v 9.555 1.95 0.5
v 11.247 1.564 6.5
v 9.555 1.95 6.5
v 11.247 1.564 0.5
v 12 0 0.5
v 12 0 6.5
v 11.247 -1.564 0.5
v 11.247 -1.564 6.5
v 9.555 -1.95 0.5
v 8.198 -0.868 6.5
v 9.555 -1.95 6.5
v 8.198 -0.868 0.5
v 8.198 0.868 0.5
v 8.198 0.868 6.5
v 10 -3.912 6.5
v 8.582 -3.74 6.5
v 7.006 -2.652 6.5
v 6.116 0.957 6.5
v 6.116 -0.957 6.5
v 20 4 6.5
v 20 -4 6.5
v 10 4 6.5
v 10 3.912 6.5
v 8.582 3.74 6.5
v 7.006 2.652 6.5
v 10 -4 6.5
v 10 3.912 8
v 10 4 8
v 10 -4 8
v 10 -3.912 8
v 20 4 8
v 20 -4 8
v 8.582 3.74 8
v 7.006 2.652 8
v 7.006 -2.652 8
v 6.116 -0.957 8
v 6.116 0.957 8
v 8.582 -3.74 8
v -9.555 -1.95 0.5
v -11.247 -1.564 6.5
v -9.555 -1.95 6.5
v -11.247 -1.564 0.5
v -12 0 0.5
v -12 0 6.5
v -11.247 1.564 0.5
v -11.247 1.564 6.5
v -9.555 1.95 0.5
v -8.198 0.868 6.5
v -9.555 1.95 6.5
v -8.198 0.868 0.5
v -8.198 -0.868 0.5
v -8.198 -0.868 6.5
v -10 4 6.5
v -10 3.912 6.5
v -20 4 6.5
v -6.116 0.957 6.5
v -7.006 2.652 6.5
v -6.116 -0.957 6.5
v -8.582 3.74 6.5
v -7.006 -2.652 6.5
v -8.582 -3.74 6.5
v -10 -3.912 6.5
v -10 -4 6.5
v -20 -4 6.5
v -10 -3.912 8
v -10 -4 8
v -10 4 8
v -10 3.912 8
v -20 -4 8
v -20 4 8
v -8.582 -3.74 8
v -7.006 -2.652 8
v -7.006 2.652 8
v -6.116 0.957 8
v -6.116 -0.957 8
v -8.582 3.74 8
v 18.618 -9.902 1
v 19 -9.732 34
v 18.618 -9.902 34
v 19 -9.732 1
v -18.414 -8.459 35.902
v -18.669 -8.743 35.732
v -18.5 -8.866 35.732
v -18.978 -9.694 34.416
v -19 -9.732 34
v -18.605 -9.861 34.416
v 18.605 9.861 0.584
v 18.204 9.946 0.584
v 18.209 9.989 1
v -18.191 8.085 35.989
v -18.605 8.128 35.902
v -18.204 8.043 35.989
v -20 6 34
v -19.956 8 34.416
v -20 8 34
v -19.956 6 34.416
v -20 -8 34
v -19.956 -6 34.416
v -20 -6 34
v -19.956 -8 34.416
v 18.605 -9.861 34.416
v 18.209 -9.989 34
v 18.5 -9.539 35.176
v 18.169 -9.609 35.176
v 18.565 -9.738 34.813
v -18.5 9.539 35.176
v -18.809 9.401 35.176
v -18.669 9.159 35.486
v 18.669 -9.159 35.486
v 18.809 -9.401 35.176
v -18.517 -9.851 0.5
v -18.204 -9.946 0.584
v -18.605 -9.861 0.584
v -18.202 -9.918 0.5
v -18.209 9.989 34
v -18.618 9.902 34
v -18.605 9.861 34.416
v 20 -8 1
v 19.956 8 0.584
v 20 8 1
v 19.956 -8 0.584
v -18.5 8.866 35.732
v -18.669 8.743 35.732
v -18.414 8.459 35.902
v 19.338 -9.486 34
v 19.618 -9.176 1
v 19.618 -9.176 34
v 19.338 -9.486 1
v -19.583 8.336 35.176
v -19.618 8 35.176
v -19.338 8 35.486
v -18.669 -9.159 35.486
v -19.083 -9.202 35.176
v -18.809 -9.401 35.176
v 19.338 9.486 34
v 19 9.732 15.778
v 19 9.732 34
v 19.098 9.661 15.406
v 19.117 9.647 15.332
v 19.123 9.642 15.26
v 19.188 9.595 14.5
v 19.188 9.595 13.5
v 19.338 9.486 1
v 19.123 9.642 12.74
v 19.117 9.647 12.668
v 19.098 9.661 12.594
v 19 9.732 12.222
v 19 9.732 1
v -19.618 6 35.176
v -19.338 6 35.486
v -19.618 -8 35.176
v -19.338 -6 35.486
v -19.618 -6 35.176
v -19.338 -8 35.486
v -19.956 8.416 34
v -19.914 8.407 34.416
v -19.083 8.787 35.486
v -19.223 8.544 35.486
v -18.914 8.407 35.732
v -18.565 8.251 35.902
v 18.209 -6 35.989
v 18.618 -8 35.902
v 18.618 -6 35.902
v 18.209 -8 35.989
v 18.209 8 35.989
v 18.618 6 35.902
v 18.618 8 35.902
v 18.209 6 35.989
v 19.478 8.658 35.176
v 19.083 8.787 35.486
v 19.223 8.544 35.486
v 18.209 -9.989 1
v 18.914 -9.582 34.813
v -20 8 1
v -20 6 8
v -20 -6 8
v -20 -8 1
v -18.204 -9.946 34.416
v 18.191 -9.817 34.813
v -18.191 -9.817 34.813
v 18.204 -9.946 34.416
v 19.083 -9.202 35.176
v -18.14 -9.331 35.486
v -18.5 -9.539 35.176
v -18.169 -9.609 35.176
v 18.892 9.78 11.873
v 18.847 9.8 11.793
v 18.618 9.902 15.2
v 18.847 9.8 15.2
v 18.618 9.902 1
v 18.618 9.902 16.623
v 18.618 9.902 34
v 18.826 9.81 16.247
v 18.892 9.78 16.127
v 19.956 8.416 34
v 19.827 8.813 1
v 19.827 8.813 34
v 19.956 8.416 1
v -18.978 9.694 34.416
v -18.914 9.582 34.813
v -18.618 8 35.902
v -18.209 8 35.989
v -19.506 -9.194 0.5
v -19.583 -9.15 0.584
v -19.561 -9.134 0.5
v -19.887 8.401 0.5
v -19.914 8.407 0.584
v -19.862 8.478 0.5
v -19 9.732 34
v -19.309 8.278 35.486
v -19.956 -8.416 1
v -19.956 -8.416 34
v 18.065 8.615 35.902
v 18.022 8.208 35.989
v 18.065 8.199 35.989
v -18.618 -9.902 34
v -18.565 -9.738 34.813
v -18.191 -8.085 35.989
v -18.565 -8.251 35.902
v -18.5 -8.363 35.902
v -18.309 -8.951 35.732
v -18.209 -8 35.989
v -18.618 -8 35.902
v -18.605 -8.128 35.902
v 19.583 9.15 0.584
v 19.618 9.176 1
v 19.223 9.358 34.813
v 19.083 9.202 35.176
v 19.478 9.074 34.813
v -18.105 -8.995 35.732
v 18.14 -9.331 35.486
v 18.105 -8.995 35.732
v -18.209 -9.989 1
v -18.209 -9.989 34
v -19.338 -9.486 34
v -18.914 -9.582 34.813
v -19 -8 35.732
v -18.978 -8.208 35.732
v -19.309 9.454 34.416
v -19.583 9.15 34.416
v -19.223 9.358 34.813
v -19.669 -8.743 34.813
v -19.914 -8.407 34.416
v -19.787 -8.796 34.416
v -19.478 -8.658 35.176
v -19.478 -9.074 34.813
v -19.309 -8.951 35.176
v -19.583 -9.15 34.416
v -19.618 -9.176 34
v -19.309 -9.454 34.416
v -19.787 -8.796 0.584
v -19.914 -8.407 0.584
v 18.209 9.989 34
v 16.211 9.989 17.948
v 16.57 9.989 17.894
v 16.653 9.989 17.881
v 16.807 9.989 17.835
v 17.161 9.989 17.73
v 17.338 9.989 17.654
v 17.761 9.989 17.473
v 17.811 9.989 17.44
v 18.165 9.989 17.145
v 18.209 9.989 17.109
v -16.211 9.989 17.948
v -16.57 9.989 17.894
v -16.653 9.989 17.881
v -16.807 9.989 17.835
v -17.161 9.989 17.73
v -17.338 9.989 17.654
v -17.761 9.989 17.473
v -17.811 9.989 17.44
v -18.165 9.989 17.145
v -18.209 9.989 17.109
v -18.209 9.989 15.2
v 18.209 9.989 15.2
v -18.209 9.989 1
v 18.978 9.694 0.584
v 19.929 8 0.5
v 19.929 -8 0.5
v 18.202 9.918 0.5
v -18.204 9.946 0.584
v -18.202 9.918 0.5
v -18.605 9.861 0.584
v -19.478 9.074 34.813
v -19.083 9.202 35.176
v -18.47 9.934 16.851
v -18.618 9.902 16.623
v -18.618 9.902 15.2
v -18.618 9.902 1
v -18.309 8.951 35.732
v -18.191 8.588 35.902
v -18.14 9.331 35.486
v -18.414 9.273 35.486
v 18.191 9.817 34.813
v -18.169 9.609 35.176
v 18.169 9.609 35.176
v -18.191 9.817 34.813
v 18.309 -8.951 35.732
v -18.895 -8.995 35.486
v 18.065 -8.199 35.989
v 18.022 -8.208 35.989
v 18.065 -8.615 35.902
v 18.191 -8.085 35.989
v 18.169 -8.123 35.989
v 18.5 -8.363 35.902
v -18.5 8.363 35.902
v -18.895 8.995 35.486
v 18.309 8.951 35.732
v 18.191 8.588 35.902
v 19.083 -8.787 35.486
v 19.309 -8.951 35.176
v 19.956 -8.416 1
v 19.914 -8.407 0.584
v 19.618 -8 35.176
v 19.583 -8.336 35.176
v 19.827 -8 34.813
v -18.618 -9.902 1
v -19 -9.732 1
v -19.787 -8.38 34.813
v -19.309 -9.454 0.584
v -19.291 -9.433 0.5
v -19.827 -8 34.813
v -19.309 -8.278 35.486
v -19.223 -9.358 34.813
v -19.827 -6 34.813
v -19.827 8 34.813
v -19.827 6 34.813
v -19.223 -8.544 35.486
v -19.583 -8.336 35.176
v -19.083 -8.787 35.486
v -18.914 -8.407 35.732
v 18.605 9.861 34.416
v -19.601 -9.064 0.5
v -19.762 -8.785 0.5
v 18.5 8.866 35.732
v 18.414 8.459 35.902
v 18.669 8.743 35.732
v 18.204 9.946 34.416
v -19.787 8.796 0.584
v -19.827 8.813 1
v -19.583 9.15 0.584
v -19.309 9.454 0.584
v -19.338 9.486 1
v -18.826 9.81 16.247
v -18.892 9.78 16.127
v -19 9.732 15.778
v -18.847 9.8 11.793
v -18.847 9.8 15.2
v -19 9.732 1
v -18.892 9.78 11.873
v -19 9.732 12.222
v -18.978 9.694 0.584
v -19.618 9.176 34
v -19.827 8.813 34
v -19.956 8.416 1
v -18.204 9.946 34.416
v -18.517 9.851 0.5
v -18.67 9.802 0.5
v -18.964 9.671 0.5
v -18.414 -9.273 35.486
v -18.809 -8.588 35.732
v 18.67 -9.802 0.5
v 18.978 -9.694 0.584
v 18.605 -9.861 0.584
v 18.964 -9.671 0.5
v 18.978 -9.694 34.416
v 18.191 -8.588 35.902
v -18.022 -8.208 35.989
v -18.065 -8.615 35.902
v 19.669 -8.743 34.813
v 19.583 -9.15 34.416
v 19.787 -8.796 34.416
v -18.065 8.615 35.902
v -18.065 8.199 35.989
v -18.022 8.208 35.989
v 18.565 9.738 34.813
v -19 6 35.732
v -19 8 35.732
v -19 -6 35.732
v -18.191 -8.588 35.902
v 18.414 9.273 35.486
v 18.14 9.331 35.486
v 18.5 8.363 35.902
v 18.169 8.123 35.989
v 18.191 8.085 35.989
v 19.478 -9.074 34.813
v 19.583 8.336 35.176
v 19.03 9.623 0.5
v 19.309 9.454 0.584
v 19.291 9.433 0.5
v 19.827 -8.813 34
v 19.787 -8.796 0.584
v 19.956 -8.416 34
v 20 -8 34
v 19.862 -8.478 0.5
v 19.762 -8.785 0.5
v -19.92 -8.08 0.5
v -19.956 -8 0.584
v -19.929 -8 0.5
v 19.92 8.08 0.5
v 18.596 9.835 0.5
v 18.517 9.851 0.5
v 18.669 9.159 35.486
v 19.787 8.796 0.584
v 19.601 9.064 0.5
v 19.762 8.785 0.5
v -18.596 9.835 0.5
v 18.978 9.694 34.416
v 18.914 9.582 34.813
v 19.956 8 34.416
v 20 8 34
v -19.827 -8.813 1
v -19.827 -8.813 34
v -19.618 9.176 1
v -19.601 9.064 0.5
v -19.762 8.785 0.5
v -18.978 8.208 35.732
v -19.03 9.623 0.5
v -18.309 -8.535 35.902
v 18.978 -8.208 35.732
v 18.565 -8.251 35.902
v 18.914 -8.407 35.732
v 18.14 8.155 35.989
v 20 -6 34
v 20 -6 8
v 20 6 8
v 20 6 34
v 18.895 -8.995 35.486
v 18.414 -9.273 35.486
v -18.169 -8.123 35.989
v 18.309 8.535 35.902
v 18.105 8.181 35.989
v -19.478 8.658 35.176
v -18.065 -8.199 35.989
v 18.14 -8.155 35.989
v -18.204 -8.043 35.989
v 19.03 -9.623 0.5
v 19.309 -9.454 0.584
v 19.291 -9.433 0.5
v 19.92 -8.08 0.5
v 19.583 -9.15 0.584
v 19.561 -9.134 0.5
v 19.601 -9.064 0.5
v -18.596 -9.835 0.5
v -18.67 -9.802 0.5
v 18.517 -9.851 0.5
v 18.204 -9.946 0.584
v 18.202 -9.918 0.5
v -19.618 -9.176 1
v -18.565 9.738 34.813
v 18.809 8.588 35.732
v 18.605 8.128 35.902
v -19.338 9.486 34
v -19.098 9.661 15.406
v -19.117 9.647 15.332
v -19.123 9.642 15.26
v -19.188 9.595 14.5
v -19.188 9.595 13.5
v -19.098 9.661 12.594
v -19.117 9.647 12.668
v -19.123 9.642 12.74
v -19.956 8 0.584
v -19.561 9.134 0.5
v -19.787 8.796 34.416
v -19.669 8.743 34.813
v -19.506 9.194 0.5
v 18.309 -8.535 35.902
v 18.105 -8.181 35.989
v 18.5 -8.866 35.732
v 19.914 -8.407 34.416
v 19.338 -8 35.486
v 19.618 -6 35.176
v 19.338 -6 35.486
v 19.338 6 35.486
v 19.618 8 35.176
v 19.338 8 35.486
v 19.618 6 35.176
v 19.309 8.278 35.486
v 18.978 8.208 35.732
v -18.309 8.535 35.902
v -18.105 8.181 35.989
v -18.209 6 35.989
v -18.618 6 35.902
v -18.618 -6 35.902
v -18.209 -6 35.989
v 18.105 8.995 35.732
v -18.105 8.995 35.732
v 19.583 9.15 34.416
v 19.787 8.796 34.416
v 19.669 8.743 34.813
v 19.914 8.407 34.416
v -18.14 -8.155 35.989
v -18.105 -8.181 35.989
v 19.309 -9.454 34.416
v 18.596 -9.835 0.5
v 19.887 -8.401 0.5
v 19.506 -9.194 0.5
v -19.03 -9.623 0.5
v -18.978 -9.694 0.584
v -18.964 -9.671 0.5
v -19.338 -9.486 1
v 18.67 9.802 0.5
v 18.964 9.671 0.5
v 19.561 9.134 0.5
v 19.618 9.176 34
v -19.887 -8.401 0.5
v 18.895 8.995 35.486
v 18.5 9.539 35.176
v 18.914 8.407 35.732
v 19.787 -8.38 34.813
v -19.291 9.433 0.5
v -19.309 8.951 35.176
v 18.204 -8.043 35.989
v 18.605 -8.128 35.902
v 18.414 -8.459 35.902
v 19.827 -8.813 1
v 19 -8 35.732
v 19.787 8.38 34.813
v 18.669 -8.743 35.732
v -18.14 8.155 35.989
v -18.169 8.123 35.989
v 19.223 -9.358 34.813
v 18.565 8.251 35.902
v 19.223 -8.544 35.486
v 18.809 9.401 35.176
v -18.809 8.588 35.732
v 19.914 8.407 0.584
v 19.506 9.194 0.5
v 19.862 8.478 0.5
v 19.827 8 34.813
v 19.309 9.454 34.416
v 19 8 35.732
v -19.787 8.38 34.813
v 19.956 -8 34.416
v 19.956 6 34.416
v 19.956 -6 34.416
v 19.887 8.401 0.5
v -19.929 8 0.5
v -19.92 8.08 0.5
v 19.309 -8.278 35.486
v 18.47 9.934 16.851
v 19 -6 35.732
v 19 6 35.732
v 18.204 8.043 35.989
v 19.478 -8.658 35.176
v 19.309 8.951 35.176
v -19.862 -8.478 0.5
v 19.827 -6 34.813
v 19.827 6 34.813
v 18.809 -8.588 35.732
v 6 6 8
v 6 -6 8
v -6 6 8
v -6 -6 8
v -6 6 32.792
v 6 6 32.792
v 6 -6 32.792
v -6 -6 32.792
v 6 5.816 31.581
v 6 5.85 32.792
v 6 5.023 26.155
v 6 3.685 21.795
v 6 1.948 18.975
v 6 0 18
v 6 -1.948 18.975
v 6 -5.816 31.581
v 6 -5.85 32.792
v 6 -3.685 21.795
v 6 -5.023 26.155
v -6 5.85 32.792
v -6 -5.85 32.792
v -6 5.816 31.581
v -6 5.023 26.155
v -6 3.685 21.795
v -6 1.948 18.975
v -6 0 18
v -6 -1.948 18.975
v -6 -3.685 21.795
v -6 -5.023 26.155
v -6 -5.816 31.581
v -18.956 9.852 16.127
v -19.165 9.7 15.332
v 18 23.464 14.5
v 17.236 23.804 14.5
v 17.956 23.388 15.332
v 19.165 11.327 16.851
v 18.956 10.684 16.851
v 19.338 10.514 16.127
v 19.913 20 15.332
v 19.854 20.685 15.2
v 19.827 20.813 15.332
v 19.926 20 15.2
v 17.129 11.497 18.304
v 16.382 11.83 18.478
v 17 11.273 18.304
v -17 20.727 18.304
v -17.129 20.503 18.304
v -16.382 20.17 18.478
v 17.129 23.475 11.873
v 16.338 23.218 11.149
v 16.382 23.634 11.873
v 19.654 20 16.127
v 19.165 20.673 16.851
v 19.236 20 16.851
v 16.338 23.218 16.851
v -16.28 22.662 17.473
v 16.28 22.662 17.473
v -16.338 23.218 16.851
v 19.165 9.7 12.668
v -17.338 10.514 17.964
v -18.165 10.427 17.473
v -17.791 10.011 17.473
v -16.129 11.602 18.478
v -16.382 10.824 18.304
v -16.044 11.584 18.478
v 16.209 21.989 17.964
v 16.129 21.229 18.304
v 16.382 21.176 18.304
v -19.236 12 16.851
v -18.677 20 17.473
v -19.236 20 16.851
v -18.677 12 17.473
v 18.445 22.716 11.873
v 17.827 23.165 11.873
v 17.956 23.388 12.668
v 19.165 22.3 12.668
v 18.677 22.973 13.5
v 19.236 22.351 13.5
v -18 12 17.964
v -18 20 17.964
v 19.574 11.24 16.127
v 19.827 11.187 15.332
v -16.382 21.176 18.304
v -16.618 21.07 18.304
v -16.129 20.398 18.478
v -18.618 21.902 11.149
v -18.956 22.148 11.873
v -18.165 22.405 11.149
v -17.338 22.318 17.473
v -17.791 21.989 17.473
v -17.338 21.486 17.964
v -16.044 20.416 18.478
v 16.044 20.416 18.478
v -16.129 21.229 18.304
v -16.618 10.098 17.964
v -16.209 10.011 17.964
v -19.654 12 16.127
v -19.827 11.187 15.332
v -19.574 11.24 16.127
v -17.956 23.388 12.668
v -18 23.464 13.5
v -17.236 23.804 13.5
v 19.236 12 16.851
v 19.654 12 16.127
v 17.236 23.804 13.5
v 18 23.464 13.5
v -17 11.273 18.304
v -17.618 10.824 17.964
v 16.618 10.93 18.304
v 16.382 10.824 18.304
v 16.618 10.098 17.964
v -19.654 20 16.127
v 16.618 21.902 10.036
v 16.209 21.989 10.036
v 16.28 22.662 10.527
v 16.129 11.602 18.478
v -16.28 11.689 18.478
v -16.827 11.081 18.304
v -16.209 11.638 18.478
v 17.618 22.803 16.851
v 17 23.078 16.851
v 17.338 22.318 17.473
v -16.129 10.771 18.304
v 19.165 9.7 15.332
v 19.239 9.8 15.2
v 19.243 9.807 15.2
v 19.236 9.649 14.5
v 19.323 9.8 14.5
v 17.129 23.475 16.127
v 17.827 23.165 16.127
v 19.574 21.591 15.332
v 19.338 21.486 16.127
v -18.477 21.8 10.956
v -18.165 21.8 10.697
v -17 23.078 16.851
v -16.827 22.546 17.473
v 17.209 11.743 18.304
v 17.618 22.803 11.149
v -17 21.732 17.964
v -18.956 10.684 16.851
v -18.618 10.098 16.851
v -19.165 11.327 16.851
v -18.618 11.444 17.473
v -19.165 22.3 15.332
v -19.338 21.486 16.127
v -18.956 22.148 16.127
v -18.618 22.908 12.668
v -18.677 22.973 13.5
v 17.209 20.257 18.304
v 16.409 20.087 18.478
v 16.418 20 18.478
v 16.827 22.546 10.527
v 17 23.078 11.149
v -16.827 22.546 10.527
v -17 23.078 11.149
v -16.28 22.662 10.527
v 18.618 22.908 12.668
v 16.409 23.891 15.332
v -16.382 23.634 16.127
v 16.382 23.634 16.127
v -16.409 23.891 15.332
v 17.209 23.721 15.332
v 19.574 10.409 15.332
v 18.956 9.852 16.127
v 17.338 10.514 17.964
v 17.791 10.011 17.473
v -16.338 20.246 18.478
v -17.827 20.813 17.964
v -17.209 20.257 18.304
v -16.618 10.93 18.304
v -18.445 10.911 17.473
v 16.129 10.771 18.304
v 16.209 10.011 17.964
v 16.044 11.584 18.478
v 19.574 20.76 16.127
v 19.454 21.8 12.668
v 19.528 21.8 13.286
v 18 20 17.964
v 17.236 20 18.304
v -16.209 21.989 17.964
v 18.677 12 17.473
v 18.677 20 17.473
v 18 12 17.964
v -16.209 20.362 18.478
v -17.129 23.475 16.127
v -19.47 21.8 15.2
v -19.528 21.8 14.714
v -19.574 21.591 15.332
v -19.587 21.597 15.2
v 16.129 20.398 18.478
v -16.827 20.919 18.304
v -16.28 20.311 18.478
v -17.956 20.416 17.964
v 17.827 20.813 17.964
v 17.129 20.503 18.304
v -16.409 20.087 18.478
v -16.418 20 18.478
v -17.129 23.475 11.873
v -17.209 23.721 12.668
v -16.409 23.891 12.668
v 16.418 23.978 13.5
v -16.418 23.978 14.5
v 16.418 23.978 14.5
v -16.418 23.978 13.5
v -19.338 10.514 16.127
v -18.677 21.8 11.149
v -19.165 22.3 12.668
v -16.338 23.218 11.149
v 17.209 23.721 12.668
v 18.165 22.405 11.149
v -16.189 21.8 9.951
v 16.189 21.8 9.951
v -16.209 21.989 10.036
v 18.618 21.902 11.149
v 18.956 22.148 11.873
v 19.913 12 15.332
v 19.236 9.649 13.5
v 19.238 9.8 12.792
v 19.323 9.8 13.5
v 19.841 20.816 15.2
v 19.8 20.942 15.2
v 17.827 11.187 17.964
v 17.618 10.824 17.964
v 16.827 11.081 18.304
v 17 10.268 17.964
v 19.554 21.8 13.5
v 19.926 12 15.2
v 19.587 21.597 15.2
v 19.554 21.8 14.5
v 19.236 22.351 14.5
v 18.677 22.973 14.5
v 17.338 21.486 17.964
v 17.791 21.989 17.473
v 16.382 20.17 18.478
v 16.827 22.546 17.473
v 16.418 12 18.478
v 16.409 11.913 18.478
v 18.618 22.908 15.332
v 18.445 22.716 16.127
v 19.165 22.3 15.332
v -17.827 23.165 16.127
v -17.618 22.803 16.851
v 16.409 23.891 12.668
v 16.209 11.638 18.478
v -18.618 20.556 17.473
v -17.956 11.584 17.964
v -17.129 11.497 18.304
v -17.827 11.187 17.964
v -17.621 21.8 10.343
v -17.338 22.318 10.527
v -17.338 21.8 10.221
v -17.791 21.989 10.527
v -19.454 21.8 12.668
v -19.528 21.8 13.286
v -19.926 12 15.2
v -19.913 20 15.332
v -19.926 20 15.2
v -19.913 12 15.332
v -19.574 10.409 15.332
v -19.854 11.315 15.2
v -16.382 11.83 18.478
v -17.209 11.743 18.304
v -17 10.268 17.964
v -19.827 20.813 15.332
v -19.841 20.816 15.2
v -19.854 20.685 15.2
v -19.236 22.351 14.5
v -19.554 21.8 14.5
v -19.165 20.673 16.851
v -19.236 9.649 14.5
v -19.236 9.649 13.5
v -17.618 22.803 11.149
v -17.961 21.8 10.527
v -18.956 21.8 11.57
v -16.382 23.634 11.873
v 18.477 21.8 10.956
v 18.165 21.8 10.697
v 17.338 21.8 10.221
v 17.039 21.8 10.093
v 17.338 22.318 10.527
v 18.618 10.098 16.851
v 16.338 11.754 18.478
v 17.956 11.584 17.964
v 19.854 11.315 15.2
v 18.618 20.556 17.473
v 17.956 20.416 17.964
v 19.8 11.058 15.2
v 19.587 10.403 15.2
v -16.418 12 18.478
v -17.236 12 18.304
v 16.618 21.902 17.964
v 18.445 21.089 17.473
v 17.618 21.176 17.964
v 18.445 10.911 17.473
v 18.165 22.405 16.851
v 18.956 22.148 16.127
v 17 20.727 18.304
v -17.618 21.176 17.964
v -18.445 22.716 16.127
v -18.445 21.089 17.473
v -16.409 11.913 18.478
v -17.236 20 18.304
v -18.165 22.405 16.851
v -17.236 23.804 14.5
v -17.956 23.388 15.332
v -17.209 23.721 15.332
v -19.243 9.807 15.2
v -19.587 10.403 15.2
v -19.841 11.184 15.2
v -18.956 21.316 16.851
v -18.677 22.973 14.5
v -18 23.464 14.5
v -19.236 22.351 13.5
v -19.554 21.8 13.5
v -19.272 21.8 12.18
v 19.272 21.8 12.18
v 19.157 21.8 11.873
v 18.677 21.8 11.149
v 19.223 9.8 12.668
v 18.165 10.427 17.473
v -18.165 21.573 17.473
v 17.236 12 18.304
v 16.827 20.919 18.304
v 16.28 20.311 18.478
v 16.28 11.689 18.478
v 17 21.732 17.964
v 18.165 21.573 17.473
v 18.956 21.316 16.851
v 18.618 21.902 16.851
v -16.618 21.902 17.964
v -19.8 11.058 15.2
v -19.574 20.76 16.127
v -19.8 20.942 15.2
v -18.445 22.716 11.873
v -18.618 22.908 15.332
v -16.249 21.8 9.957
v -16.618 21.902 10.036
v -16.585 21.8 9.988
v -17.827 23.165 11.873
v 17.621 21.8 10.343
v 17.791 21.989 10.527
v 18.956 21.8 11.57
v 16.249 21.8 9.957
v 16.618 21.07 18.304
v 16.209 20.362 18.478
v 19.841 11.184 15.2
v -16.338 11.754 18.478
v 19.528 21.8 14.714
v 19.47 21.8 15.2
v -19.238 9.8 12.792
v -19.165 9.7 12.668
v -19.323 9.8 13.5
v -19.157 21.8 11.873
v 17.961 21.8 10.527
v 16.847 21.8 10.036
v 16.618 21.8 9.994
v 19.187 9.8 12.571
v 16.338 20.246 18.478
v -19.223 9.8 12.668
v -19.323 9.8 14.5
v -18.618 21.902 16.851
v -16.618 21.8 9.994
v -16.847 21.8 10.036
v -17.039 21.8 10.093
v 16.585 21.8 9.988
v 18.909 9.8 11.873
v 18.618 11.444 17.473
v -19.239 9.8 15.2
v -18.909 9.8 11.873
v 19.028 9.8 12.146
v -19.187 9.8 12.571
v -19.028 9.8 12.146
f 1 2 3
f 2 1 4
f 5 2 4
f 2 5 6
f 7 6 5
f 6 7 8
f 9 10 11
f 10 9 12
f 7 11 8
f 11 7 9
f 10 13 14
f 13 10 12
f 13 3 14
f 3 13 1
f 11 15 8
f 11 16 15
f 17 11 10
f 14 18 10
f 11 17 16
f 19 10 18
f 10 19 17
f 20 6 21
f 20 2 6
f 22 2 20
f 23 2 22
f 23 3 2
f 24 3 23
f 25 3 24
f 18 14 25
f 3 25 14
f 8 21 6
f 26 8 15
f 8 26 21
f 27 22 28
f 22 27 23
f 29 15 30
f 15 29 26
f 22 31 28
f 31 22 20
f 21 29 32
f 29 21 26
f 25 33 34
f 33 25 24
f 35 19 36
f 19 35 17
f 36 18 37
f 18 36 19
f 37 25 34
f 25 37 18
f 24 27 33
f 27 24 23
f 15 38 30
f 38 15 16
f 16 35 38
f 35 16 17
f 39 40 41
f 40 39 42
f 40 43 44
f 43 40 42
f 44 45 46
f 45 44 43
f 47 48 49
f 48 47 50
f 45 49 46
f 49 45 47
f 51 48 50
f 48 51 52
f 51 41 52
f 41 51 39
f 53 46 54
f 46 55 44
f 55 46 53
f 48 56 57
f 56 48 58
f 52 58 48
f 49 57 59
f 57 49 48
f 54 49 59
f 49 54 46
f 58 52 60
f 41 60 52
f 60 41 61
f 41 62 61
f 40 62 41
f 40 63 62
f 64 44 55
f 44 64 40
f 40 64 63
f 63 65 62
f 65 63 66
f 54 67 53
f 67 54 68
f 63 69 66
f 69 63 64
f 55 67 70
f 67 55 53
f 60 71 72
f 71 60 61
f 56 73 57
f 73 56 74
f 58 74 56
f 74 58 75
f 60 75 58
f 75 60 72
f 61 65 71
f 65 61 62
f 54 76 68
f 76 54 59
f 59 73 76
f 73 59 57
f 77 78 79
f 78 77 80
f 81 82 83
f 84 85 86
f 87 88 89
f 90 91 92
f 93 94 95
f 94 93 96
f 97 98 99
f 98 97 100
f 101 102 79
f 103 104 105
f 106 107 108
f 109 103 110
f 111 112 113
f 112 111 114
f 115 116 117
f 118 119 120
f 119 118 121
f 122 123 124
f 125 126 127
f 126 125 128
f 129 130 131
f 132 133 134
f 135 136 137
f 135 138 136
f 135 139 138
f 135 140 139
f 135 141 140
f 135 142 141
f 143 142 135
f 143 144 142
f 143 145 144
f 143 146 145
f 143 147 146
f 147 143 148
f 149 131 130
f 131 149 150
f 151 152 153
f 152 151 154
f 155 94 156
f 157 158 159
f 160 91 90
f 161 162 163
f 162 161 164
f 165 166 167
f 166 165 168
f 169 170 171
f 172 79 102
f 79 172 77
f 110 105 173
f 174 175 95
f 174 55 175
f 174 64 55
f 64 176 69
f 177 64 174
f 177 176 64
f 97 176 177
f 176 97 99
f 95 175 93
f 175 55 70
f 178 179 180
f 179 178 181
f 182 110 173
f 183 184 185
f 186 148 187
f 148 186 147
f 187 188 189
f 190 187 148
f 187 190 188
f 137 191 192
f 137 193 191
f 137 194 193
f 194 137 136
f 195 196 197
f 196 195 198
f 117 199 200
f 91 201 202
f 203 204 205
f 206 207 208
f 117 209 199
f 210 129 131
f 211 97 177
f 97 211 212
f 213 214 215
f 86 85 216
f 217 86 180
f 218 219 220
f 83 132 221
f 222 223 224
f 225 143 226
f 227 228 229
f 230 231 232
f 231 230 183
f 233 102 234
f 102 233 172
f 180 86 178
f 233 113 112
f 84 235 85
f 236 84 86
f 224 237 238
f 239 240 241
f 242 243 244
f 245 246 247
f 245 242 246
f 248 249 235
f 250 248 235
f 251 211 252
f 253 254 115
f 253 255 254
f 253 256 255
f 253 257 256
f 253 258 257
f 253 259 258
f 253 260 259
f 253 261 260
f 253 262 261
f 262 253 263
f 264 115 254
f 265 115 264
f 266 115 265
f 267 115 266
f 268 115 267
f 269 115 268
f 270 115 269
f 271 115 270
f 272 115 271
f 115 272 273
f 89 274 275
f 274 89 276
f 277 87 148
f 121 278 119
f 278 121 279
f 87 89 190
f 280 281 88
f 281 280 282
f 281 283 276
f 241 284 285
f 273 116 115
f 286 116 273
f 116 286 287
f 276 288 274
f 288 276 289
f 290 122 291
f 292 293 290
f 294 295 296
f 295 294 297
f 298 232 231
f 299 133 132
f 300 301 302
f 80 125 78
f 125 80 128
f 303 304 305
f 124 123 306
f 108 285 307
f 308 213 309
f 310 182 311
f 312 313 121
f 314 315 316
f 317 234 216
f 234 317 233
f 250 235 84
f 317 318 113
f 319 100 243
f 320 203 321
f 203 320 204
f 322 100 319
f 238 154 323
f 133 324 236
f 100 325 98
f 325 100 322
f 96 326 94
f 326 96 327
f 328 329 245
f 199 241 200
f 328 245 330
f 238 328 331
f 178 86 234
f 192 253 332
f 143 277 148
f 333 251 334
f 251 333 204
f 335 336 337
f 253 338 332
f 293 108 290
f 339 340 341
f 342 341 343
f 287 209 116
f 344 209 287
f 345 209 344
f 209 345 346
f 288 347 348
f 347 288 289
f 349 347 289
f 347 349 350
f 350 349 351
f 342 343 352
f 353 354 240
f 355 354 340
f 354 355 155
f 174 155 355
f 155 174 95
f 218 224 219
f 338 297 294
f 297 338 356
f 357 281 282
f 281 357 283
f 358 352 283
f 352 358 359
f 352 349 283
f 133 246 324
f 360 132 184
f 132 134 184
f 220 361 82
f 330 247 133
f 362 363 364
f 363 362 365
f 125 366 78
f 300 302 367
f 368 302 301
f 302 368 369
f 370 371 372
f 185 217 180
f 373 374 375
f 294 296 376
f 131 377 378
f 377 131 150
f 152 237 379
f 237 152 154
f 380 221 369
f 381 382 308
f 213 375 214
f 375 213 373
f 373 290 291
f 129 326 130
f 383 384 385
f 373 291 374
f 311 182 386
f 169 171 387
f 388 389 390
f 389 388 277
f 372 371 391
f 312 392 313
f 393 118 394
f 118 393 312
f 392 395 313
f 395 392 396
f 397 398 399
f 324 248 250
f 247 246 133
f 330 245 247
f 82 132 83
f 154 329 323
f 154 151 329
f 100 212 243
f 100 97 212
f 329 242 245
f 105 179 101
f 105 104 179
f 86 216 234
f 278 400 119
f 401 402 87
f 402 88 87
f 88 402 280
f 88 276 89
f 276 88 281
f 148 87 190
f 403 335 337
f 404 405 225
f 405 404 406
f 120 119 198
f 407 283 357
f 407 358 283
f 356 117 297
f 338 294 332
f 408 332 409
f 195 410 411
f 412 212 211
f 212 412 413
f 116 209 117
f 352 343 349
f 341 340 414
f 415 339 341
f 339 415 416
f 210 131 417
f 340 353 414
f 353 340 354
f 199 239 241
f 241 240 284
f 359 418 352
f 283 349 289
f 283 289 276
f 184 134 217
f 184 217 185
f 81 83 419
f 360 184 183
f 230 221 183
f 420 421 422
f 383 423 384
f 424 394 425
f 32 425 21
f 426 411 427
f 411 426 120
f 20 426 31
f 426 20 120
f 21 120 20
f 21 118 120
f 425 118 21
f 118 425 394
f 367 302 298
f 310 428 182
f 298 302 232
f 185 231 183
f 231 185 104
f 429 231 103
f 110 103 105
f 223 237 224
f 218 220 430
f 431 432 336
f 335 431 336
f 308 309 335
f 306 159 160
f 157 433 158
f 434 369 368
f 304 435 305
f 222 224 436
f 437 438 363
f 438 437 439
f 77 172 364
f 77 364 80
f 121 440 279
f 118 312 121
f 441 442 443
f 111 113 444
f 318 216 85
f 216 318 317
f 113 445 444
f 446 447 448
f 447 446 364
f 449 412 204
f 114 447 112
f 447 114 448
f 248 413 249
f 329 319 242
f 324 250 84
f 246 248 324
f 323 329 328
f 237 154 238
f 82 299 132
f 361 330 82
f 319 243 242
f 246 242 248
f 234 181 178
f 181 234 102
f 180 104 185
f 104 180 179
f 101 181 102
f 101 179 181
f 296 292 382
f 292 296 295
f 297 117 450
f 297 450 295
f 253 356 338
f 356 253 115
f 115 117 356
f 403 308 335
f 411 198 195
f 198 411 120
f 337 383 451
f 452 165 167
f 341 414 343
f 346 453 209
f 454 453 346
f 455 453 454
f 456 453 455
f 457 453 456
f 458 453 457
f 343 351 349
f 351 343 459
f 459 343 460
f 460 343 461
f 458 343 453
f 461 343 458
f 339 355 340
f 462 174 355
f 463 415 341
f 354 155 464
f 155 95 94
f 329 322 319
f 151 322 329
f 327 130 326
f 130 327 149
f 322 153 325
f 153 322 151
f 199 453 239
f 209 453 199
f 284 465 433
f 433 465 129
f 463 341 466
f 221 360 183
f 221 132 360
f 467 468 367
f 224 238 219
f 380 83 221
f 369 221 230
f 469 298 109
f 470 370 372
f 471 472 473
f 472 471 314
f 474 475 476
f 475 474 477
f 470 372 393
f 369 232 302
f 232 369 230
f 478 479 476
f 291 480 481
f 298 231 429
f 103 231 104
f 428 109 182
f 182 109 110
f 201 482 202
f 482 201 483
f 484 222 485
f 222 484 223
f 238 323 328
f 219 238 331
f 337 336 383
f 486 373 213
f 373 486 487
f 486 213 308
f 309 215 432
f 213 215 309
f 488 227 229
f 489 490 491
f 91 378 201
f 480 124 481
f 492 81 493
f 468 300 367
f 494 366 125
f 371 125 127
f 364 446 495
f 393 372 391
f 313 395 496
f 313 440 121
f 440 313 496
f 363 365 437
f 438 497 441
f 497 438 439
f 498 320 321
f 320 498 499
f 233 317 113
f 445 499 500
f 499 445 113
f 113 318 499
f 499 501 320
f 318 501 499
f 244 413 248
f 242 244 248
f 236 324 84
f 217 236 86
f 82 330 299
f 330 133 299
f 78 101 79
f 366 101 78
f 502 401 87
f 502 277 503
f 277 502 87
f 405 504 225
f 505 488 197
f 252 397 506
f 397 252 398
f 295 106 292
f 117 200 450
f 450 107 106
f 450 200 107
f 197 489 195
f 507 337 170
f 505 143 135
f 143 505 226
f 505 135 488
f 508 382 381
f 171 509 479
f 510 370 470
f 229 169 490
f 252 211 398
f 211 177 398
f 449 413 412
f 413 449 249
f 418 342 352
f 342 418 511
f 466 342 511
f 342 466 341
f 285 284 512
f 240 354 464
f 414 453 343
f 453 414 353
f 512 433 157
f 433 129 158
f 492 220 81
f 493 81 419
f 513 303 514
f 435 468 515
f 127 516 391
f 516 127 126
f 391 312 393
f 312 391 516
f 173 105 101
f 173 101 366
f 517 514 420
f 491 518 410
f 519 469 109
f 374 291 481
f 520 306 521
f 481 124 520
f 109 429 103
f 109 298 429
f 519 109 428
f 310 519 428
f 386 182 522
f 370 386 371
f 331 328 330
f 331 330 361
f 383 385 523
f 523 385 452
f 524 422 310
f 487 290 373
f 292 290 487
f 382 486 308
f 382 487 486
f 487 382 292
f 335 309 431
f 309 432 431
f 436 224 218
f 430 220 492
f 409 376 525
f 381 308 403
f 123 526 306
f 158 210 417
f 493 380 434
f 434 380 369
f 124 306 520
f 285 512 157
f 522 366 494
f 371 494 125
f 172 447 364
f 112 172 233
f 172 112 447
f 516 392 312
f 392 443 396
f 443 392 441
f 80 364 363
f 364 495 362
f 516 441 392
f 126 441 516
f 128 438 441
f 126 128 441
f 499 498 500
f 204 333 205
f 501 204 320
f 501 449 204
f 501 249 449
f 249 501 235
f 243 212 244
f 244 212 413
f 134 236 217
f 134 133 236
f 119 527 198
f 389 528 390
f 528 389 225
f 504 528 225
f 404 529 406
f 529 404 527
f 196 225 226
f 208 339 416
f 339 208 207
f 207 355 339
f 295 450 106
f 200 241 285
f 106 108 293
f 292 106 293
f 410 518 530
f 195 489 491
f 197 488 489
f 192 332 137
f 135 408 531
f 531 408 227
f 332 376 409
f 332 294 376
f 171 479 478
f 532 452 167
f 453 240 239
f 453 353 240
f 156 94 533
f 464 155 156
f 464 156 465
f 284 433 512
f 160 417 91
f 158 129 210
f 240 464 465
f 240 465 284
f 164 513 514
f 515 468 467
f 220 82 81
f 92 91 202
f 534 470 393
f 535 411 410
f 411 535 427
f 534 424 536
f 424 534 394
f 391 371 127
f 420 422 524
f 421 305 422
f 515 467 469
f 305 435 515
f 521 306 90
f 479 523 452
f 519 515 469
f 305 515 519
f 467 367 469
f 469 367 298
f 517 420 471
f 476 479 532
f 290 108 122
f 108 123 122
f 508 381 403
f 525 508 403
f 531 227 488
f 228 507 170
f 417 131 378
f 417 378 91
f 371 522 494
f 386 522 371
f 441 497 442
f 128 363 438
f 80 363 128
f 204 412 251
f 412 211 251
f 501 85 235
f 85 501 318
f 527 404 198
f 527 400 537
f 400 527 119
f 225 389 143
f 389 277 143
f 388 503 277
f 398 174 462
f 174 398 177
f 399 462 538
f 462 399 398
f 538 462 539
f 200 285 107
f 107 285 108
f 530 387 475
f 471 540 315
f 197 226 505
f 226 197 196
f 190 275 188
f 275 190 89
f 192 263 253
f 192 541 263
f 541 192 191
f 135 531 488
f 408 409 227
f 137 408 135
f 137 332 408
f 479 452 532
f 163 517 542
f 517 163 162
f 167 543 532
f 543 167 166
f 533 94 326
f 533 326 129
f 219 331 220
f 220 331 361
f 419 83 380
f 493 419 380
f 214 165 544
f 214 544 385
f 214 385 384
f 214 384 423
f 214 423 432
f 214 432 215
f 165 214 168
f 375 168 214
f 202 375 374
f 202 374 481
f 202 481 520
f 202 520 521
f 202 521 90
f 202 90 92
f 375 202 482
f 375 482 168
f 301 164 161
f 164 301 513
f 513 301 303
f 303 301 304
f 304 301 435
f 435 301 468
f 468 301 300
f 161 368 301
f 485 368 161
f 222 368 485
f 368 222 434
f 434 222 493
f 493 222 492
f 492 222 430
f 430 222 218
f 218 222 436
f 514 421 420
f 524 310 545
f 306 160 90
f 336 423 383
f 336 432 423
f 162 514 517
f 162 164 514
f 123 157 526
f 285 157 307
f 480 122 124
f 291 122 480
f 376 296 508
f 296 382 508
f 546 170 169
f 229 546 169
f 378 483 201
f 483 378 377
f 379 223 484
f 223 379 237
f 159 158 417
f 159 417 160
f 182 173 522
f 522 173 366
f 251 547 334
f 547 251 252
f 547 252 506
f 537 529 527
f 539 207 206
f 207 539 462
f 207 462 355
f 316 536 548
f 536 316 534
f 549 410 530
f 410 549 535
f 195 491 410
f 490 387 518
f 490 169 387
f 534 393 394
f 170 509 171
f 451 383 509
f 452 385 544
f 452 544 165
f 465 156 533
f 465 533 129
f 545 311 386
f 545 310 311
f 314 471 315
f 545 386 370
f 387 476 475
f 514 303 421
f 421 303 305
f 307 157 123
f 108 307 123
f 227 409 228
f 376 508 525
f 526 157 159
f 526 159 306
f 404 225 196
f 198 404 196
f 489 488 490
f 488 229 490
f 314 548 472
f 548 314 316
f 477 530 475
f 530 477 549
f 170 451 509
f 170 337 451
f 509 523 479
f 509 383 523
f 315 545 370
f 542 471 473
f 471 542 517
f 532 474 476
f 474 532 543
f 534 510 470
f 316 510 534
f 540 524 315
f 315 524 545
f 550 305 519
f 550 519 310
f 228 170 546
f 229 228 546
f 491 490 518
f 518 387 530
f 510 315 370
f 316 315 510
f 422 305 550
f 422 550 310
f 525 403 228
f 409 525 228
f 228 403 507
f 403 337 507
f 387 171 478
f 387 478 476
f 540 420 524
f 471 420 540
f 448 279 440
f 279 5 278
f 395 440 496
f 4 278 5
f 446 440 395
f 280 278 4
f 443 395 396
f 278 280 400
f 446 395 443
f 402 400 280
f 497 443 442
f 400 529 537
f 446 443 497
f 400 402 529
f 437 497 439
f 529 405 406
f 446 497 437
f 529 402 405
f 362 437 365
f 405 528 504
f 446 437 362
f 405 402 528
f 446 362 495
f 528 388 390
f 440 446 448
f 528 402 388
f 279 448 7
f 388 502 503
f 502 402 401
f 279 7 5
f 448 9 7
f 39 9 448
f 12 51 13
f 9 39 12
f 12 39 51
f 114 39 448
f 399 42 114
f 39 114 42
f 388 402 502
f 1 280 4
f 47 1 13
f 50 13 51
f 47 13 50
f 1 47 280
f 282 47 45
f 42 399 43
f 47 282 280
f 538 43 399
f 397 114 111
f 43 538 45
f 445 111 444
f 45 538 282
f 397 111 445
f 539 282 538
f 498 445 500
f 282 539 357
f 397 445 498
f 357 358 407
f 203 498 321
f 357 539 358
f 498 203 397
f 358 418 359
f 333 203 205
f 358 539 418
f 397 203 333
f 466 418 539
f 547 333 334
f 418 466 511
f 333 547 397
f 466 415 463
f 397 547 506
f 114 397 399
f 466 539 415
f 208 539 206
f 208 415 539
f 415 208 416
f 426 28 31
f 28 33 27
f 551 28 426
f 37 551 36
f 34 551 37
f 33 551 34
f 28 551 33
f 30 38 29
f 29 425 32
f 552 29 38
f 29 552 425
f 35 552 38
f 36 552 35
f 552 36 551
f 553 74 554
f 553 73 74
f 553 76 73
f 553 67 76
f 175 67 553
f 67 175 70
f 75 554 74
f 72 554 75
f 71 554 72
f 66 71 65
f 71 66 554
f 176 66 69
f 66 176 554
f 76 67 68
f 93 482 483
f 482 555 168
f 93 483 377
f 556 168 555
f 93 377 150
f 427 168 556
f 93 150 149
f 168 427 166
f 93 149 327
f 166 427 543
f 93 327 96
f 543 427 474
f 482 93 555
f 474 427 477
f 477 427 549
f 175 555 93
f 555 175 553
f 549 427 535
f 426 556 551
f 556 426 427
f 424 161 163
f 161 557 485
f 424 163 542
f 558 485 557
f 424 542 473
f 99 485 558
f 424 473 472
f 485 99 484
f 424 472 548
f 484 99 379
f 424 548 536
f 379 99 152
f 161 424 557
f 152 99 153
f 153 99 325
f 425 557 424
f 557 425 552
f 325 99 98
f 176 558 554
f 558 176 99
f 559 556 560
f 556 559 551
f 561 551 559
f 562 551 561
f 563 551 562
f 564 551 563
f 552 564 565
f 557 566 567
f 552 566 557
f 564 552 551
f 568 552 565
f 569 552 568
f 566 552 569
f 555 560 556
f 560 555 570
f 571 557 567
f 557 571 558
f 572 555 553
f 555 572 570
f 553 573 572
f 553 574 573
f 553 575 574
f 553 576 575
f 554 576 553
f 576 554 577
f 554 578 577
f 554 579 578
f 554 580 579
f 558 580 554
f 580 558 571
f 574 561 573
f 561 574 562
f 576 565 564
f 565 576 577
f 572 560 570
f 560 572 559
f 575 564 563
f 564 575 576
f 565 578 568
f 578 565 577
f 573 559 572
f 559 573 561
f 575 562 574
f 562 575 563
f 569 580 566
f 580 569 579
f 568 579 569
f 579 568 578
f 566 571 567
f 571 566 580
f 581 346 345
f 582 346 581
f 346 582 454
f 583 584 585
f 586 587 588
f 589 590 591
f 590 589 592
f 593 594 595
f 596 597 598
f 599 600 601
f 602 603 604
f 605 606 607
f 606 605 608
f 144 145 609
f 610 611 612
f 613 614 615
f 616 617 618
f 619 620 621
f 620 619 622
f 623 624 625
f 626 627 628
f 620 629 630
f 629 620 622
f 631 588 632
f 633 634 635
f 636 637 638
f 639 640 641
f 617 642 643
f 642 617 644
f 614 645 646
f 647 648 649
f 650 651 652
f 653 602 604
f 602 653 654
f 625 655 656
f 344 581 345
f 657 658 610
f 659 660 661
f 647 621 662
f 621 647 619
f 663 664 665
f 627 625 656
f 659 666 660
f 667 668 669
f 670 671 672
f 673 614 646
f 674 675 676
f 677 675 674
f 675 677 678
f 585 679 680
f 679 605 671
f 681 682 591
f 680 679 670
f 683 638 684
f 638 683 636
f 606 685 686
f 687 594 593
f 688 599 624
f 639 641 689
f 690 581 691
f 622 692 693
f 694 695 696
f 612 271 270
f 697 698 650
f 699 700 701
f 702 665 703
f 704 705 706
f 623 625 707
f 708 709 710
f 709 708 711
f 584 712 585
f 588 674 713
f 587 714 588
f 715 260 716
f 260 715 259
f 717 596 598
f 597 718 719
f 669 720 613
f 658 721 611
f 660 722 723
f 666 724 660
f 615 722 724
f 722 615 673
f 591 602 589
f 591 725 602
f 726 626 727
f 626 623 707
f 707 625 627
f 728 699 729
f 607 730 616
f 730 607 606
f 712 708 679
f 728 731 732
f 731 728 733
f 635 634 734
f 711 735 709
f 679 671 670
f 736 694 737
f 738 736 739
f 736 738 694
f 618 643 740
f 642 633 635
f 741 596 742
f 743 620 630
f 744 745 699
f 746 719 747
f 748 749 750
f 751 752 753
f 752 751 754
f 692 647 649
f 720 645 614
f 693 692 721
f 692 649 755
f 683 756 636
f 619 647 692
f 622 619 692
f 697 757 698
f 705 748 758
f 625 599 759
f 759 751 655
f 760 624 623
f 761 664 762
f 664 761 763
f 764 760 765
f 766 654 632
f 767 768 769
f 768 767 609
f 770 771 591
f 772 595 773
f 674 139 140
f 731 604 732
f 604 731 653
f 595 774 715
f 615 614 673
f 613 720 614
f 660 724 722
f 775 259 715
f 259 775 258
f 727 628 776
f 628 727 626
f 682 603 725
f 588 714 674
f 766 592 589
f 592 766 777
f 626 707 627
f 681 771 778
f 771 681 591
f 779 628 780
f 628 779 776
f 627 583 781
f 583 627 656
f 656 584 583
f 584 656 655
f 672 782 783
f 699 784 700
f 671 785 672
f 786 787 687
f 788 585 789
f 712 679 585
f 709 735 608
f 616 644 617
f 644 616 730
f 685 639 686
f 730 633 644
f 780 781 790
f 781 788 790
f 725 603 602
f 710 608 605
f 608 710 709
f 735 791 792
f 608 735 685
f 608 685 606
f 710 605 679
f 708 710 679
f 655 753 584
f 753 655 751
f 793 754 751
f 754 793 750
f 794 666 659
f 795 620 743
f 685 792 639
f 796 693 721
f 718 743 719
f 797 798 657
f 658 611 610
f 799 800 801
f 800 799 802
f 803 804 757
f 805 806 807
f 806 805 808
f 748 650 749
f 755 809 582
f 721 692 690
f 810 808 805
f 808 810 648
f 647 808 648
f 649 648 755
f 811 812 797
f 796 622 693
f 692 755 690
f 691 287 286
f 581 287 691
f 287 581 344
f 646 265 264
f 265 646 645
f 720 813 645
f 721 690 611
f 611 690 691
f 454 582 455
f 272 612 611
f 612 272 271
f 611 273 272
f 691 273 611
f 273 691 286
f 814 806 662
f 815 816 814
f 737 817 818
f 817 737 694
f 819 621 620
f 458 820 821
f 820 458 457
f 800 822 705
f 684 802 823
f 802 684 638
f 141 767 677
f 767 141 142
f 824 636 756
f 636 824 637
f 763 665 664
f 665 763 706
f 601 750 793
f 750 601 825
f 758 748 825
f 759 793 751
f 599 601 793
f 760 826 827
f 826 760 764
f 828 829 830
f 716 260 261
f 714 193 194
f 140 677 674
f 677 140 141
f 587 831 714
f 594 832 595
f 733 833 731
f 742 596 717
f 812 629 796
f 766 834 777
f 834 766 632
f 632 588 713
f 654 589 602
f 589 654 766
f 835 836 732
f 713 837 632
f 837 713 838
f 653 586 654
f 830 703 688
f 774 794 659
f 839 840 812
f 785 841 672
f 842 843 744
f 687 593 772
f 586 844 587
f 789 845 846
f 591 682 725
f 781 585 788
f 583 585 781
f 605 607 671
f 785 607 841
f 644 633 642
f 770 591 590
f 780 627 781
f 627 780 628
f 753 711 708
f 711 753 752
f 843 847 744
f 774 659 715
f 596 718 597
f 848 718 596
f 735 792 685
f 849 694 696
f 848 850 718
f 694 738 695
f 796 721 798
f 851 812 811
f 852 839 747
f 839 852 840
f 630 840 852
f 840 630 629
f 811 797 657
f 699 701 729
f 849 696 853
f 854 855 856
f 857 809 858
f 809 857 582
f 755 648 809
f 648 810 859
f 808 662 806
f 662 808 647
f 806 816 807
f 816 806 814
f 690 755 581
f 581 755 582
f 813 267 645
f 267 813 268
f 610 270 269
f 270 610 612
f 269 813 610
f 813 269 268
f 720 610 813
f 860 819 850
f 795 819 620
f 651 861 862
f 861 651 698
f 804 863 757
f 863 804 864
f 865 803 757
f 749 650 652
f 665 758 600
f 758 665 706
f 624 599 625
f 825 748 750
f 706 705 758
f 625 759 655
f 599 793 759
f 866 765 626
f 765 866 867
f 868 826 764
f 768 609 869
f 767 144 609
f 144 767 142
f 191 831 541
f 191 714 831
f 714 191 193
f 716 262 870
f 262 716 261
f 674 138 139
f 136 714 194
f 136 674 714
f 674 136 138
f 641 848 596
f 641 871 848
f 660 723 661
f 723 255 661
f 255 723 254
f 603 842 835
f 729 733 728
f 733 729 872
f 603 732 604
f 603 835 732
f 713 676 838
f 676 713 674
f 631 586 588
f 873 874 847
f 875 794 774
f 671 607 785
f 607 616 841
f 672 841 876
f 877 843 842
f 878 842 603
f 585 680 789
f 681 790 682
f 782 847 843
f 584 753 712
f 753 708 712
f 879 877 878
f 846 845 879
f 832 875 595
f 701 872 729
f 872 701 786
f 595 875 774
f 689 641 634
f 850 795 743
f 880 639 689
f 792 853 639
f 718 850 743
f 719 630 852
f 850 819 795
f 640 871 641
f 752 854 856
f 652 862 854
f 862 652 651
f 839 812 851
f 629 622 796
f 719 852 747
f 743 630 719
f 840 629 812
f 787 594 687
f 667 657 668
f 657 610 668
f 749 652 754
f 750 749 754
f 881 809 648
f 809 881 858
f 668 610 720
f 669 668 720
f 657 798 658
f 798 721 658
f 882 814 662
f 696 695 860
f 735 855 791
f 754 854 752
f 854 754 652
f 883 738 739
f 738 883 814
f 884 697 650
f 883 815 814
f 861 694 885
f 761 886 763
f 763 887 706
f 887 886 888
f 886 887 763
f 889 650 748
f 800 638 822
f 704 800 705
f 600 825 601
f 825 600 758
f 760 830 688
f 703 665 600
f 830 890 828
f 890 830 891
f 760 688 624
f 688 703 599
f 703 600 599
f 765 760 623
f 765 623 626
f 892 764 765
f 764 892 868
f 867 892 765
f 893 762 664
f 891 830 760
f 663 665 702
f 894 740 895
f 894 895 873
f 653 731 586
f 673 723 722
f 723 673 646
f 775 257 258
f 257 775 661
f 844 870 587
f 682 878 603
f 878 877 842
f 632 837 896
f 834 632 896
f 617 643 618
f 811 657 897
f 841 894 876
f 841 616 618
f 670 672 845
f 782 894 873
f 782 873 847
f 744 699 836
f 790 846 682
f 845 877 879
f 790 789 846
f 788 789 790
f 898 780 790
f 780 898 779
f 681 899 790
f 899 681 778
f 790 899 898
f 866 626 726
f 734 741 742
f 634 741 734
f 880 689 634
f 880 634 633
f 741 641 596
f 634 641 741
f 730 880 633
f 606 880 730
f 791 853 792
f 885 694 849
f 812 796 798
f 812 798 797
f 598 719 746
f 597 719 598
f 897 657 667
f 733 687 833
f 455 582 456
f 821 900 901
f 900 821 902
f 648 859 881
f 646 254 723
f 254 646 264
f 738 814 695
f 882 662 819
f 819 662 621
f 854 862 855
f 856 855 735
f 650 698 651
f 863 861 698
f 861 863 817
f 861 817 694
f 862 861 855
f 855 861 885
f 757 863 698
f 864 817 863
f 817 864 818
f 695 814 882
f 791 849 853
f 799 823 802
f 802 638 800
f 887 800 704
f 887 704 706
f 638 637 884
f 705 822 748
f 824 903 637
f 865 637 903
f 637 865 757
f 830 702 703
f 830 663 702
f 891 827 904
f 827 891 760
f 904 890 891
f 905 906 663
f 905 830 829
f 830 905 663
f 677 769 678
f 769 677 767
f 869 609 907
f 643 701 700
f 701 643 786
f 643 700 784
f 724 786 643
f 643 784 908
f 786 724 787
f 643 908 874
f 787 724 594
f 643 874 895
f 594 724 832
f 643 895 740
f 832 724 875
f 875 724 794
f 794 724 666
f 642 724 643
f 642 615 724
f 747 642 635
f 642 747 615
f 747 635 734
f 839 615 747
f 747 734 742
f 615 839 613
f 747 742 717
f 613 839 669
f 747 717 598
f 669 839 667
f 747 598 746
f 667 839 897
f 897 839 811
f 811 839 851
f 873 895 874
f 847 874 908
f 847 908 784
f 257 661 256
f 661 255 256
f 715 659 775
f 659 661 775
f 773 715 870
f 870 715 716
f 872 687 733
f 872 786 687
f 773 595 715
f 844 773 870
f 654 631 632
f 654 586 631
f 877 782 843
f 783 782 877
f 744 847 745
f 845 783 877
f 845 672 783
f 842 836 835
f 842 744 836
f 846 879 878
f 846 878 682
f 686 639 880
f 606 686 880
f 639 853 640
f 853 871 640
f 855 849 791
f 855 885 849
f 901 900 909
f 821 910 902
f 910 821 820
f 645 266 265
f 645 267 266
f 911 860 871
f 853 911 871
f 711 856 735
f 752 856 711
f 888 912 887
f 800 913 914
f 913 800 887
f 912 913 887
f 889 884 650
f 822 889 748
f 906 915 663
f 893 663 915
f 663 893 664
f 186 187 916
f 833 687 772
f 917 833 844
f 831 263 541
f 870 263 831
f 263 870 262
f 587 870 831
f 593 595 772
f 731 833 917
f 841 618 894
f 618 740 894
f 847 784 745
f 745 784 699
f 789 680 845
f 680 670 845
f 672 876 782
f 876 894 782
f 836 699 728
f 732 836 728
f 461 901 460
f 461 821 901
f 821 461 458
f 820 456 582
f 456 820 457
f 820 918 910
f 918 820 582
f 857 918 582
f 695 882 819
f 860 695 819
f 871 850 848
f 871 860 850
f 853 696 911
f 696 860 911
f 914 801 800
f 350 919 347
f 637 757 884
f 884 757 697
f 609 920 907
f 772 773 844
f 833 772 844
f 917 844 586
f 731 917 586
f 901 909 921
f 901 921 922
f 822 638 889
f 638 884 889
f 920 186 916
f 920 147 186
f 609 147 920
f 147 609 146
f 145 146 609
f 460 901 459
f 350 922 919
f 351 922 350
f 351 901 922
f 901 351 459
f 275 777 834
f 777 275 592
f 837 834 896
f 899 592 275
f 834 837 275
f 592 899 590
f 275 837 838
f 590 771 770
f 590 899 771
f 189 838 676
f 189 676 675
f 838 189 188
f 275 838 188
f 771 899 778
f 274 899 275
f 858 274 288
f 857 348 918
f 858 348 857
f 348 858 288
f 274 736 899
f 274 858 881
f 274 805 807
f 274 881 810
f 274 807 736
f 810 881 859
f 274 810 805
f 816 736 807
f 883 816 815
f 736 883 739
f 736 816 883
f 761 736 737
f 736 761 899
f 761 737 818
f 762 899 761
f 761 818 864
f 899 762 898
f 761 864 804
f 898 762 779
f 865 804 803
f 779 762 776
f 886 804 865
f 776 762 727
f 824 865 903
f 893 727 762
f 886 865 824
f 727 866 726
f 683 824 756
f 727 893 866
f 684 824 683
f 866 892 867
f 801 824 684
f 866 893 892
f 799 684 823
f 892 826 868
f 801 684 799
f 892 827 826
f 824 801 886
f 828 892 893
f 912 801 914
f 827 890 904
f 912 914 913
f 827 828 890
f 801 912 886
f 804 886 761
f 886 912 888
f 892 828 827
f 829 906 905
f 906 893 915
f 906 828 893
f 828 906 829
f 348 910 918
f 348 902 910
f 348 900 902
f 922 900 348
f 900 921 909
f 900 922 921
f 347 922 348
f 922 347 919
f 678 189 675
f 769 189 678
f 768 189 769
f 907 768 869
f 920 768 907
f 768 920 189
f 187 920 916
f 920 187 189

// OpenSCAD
include<lib.scad>

base_l=40;
base_w=20;
base_h=8;
back_d=8;
open_w=12;
clamp_h=35;
vis=4;
tete_vis=8;
ecart_vis=20;
grip_w=12;
grip_h=14;
grip_d=6;


module pass_vis(angle) {
    rotate([0,0,angle]) union()  {
        cylinder(d=vis, h=base_h*2, center=true);
        translate([base_l/4,0,base_h/2])
            cube([base_l/2,tete_vis,3], center=true);
        translate([0,0,base_h/2])
            cylinder(d=tete_vis, h=3, center=true);
    }
}

module clamp() {
    difference() {
        translate([0,0,clamp_h/2])
            hull_box(base_l,base_w,clamp_h+2, 2, center=true);
        translate([0,0,-0.5])
            cube([base_l,base_w,2], center=true);
        translate([0,0,base_h+clamp_h/2])
            cube([base_l,open_w,clamp_h], center=true);
        translate([ecart_vis/2,0,base_h/2])
            pass_vis(0);
        translate([-ecart_vis/2,0,base_h/2])
            pass_vis(180);
    }
	difference() {
		translate([0,0,base_h+clamp_h/3])
			cube([12,open_w*1.05,clamp_h*3/4], center=true);
		translate([0,0,base_h+clamp_h*0.8]) scale([1,1,3]) rotate([0,90,0])
#			cylinder(d=open_w, h=12.05, center=true);
	}
    translate([0,(base_w+grip_w)/2,grip_h])
    difference() {
        hull_box(base_l,grip_w+4,grip_d+3, 4, center=true);
#        translate([0,-0.2,grip_d*0.2-grip_h/2])
            cube([base_l,grip_w,grip_h], center=true);
    }
}

module spacer(h) {
    difference() {
        cube([base_l,base_w,h], center=true);
        translate([ecart_vis/2,0,h/2])
#            cylinder(d=back_d, h=h*3, center=true);
        translate([-ecart_vis/2,0,h/2])
#            cylinder(d=back_d, h=h*3, center=true);
    }
}
 

clamp();

%spacer(1.5);
